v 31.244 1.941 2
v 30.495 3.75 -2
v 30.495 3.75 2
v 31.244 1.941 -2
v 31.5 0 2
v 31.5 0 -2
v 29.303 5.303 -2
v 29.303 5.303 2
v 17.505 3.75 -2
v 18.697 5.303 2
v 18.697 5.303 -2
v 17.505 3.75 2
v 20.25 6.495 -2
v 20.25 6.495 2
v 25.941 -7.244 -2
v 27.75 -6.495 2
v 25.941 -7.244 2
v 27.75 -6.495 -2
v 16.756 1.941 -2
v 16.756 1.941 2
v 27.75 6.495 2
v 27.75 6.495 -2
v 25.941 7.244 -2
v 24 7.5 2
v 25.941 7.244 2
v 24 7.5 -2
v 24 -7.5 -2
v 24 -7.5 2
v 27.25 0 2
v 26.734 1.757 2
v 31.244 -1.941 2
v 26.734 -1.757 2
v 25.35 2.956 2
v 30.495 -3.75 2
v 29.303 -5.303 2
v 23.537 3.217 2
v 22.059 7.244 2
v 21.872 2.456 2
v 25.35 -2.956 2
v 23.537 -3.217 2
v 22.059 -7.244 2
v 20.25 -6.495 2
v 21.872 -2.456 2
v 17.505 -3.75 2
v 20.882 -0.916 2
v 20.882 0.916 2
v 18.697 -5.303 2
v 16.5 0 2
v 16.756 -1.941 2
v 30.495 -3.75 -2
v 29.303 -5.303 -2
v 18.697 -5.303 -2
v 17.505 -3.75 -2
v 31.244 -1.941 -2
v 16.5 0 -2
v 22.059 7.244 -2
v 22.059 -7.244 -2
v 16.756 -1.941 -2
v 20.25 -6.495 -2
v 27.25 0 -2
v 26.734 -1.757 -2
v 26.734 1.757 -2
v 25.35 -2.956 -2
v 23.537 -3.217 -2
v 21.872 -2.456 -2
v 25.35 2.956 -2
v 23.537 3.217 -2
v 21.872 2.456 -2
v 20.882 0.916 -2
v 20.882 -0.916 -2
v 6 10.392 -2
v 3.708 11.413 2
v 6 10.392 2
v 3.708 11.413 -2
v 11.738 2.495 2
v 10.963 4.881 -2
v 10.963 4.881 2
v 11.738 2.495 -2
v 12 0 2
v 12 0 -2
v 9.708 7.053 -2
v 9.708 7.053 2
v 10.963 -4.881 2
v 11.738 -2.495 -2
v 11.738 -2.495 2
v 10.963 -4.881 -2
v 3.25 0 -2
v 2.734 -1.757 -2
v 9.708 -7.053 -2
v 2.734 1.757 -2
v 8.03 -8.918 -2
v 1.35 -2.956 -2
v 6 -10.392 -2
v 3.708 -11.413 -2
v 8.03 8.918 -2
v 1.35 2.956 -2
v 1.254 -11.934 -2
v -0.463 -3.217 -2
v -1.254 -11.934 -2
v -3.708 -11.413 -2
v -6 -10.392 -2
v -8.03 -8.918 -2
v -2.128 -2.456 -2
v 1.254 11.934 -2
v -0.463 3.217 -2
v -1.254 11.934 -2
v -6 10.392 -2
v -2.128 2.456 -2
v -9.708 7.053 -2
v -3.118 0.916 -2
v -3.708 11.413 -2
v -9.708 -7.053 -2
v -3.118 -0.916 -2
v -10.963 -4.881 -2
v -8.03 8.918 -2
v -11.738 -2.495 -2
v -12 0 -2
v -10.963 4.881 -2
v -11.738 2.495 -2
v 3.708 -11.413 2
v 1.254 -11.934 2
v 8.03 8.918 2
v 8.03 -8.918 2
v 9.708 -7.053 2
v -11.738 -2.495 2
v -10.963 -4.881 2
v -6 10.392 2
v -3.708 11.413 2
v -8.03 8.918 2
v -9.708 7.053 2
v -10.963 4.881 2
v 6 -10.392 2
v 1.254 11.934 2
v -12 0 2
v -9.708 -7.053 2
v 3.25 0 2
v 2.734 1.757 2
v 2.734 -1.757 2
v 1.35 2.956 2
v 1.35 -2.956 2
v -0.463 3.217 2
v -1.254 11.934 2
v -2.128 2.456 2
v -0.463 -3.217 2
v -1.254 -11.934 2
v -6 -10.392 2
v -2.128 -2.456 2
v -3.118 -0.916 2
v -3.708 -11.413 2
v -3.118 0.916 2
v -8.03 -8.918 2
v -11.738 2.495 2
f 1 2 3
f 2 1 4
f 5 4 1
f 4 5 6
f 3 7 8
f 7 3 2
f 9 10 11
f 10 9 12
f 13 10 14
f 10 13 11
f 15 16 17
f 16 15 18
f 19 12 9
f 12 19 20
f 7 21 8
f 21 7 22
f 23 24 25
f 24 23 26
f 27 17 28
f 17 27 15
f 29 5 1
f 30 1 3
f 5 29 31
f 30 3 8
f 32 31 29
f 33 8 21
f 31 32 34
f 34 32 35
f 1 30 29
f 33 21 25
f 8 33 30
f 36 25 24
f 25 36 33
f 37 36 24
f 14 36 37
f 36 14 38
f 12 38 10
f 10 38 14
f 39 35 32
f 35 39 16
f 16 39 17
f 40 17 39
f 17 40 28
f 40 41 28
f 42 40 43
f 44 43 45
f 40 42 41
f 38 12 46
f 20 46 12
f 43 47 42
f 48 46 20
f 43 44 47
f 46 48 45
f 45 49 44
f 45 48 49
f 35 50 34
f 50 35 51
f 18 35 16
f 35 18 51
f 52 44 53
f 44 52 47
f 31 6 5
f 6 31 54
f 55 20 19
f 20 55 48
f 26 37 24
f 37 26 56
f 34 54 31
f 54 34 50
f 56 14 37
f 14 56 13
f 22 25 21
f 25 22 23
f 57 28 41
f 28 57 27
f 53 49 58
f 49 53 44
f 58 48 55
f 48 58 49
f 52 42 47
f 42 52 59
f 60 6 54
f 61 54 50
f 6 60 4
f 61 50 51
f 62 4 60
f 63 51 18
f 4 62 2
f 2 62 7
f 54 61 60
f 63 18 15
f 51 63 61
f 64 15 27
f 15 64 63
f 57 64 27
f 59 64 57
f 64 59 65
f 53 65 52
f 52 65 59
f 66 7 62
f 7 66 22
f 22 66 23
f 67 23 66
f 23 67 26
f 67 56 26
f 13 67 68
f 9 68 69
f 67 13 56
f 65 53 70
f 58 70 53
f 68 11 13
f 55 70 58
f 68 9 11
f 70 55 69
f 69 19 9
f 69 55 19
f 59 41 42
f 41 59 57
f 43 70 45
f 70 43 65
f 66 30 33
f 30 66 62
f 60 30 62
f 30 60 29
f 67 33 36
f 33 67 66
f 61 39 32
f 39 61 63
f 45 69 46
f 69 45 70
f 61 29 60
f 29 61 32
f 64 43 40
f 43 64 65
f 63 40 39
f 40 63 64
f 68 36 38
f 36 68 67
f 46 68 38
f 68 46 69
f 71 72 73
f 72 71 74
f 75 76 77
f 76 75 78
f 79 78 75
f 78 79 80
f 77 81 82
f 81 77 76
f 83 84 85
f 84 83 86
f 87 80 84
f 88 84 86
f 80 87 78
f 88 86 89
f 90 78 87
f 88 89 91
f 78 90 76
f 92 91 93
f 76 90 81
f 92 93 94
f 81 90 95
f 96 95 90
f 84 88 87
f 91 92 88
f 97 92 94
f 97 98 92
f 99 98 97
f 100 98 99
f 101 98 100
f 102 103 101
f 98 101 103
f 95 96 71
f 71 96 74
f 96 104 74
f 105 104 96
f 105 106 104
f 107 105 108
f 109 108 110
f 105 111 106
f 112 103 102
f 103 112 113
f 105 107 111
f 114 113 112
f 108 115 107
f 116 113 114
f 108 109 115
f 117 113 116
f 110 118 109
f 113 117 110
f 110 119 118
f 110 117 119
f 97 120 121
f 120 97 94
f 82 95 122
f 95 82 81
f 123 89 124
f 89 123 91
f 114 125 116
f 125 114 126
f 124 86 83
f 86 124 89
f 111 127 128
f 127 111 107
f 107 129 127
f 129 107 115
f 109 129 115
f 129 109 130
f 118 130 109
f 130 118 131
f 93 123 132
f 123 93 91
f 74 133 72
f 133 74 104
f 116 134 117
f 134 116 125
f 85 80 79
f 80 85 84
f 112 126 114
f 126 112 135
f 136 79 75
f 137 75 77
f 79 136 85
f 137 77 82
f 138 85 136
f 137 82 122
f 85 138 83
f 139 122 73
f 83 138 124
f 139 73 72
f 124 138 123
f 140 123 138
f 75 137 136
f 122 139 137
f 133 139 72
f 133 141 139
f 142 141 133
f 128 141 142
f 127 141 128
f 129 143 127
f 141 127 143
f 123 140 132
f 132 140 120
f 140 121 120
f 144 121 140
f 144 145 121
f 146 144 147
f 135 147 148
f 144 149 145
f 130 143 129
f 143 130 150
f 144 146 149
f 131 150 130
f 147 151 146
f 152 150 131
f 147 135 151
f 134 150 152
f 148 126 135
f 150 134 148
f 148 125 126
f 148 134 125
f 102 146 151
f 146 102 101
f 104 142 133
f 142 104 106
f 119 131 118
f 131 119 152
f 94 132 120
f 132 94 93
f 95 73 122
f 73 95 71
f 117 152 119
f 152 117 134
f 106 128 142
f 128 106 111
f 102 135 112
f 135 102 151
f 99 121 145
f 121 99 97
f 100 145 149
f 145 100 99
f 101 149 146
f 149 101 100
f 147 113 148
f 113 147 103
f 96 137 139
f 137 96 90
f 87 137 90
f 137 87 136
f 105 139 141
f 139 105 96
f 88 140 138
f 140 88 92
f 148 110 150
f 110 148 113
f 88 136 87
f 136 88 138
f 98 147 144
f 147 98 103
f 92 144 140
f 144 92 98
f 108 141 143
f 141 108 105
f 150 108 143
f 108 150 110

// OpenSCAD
d_small_nut = 15;
d_big_nut = 24;
h_nut = 4;

translate([d_big_nut,0,0])
nut_small();
nut_big();
module nut_small(){
    difference(){
        
        cylinder(d = d_small_nut, h = h_nut, center=true);
        cylinder(h = 40, d=6.5, center = true);
    }
}

module nut_big(){
    difference(){
        
        cylinder(d = d_big_nut, h = h_nut, center=true);
        cylinder(h = 40, d=6.5, center = true);
    }
}
